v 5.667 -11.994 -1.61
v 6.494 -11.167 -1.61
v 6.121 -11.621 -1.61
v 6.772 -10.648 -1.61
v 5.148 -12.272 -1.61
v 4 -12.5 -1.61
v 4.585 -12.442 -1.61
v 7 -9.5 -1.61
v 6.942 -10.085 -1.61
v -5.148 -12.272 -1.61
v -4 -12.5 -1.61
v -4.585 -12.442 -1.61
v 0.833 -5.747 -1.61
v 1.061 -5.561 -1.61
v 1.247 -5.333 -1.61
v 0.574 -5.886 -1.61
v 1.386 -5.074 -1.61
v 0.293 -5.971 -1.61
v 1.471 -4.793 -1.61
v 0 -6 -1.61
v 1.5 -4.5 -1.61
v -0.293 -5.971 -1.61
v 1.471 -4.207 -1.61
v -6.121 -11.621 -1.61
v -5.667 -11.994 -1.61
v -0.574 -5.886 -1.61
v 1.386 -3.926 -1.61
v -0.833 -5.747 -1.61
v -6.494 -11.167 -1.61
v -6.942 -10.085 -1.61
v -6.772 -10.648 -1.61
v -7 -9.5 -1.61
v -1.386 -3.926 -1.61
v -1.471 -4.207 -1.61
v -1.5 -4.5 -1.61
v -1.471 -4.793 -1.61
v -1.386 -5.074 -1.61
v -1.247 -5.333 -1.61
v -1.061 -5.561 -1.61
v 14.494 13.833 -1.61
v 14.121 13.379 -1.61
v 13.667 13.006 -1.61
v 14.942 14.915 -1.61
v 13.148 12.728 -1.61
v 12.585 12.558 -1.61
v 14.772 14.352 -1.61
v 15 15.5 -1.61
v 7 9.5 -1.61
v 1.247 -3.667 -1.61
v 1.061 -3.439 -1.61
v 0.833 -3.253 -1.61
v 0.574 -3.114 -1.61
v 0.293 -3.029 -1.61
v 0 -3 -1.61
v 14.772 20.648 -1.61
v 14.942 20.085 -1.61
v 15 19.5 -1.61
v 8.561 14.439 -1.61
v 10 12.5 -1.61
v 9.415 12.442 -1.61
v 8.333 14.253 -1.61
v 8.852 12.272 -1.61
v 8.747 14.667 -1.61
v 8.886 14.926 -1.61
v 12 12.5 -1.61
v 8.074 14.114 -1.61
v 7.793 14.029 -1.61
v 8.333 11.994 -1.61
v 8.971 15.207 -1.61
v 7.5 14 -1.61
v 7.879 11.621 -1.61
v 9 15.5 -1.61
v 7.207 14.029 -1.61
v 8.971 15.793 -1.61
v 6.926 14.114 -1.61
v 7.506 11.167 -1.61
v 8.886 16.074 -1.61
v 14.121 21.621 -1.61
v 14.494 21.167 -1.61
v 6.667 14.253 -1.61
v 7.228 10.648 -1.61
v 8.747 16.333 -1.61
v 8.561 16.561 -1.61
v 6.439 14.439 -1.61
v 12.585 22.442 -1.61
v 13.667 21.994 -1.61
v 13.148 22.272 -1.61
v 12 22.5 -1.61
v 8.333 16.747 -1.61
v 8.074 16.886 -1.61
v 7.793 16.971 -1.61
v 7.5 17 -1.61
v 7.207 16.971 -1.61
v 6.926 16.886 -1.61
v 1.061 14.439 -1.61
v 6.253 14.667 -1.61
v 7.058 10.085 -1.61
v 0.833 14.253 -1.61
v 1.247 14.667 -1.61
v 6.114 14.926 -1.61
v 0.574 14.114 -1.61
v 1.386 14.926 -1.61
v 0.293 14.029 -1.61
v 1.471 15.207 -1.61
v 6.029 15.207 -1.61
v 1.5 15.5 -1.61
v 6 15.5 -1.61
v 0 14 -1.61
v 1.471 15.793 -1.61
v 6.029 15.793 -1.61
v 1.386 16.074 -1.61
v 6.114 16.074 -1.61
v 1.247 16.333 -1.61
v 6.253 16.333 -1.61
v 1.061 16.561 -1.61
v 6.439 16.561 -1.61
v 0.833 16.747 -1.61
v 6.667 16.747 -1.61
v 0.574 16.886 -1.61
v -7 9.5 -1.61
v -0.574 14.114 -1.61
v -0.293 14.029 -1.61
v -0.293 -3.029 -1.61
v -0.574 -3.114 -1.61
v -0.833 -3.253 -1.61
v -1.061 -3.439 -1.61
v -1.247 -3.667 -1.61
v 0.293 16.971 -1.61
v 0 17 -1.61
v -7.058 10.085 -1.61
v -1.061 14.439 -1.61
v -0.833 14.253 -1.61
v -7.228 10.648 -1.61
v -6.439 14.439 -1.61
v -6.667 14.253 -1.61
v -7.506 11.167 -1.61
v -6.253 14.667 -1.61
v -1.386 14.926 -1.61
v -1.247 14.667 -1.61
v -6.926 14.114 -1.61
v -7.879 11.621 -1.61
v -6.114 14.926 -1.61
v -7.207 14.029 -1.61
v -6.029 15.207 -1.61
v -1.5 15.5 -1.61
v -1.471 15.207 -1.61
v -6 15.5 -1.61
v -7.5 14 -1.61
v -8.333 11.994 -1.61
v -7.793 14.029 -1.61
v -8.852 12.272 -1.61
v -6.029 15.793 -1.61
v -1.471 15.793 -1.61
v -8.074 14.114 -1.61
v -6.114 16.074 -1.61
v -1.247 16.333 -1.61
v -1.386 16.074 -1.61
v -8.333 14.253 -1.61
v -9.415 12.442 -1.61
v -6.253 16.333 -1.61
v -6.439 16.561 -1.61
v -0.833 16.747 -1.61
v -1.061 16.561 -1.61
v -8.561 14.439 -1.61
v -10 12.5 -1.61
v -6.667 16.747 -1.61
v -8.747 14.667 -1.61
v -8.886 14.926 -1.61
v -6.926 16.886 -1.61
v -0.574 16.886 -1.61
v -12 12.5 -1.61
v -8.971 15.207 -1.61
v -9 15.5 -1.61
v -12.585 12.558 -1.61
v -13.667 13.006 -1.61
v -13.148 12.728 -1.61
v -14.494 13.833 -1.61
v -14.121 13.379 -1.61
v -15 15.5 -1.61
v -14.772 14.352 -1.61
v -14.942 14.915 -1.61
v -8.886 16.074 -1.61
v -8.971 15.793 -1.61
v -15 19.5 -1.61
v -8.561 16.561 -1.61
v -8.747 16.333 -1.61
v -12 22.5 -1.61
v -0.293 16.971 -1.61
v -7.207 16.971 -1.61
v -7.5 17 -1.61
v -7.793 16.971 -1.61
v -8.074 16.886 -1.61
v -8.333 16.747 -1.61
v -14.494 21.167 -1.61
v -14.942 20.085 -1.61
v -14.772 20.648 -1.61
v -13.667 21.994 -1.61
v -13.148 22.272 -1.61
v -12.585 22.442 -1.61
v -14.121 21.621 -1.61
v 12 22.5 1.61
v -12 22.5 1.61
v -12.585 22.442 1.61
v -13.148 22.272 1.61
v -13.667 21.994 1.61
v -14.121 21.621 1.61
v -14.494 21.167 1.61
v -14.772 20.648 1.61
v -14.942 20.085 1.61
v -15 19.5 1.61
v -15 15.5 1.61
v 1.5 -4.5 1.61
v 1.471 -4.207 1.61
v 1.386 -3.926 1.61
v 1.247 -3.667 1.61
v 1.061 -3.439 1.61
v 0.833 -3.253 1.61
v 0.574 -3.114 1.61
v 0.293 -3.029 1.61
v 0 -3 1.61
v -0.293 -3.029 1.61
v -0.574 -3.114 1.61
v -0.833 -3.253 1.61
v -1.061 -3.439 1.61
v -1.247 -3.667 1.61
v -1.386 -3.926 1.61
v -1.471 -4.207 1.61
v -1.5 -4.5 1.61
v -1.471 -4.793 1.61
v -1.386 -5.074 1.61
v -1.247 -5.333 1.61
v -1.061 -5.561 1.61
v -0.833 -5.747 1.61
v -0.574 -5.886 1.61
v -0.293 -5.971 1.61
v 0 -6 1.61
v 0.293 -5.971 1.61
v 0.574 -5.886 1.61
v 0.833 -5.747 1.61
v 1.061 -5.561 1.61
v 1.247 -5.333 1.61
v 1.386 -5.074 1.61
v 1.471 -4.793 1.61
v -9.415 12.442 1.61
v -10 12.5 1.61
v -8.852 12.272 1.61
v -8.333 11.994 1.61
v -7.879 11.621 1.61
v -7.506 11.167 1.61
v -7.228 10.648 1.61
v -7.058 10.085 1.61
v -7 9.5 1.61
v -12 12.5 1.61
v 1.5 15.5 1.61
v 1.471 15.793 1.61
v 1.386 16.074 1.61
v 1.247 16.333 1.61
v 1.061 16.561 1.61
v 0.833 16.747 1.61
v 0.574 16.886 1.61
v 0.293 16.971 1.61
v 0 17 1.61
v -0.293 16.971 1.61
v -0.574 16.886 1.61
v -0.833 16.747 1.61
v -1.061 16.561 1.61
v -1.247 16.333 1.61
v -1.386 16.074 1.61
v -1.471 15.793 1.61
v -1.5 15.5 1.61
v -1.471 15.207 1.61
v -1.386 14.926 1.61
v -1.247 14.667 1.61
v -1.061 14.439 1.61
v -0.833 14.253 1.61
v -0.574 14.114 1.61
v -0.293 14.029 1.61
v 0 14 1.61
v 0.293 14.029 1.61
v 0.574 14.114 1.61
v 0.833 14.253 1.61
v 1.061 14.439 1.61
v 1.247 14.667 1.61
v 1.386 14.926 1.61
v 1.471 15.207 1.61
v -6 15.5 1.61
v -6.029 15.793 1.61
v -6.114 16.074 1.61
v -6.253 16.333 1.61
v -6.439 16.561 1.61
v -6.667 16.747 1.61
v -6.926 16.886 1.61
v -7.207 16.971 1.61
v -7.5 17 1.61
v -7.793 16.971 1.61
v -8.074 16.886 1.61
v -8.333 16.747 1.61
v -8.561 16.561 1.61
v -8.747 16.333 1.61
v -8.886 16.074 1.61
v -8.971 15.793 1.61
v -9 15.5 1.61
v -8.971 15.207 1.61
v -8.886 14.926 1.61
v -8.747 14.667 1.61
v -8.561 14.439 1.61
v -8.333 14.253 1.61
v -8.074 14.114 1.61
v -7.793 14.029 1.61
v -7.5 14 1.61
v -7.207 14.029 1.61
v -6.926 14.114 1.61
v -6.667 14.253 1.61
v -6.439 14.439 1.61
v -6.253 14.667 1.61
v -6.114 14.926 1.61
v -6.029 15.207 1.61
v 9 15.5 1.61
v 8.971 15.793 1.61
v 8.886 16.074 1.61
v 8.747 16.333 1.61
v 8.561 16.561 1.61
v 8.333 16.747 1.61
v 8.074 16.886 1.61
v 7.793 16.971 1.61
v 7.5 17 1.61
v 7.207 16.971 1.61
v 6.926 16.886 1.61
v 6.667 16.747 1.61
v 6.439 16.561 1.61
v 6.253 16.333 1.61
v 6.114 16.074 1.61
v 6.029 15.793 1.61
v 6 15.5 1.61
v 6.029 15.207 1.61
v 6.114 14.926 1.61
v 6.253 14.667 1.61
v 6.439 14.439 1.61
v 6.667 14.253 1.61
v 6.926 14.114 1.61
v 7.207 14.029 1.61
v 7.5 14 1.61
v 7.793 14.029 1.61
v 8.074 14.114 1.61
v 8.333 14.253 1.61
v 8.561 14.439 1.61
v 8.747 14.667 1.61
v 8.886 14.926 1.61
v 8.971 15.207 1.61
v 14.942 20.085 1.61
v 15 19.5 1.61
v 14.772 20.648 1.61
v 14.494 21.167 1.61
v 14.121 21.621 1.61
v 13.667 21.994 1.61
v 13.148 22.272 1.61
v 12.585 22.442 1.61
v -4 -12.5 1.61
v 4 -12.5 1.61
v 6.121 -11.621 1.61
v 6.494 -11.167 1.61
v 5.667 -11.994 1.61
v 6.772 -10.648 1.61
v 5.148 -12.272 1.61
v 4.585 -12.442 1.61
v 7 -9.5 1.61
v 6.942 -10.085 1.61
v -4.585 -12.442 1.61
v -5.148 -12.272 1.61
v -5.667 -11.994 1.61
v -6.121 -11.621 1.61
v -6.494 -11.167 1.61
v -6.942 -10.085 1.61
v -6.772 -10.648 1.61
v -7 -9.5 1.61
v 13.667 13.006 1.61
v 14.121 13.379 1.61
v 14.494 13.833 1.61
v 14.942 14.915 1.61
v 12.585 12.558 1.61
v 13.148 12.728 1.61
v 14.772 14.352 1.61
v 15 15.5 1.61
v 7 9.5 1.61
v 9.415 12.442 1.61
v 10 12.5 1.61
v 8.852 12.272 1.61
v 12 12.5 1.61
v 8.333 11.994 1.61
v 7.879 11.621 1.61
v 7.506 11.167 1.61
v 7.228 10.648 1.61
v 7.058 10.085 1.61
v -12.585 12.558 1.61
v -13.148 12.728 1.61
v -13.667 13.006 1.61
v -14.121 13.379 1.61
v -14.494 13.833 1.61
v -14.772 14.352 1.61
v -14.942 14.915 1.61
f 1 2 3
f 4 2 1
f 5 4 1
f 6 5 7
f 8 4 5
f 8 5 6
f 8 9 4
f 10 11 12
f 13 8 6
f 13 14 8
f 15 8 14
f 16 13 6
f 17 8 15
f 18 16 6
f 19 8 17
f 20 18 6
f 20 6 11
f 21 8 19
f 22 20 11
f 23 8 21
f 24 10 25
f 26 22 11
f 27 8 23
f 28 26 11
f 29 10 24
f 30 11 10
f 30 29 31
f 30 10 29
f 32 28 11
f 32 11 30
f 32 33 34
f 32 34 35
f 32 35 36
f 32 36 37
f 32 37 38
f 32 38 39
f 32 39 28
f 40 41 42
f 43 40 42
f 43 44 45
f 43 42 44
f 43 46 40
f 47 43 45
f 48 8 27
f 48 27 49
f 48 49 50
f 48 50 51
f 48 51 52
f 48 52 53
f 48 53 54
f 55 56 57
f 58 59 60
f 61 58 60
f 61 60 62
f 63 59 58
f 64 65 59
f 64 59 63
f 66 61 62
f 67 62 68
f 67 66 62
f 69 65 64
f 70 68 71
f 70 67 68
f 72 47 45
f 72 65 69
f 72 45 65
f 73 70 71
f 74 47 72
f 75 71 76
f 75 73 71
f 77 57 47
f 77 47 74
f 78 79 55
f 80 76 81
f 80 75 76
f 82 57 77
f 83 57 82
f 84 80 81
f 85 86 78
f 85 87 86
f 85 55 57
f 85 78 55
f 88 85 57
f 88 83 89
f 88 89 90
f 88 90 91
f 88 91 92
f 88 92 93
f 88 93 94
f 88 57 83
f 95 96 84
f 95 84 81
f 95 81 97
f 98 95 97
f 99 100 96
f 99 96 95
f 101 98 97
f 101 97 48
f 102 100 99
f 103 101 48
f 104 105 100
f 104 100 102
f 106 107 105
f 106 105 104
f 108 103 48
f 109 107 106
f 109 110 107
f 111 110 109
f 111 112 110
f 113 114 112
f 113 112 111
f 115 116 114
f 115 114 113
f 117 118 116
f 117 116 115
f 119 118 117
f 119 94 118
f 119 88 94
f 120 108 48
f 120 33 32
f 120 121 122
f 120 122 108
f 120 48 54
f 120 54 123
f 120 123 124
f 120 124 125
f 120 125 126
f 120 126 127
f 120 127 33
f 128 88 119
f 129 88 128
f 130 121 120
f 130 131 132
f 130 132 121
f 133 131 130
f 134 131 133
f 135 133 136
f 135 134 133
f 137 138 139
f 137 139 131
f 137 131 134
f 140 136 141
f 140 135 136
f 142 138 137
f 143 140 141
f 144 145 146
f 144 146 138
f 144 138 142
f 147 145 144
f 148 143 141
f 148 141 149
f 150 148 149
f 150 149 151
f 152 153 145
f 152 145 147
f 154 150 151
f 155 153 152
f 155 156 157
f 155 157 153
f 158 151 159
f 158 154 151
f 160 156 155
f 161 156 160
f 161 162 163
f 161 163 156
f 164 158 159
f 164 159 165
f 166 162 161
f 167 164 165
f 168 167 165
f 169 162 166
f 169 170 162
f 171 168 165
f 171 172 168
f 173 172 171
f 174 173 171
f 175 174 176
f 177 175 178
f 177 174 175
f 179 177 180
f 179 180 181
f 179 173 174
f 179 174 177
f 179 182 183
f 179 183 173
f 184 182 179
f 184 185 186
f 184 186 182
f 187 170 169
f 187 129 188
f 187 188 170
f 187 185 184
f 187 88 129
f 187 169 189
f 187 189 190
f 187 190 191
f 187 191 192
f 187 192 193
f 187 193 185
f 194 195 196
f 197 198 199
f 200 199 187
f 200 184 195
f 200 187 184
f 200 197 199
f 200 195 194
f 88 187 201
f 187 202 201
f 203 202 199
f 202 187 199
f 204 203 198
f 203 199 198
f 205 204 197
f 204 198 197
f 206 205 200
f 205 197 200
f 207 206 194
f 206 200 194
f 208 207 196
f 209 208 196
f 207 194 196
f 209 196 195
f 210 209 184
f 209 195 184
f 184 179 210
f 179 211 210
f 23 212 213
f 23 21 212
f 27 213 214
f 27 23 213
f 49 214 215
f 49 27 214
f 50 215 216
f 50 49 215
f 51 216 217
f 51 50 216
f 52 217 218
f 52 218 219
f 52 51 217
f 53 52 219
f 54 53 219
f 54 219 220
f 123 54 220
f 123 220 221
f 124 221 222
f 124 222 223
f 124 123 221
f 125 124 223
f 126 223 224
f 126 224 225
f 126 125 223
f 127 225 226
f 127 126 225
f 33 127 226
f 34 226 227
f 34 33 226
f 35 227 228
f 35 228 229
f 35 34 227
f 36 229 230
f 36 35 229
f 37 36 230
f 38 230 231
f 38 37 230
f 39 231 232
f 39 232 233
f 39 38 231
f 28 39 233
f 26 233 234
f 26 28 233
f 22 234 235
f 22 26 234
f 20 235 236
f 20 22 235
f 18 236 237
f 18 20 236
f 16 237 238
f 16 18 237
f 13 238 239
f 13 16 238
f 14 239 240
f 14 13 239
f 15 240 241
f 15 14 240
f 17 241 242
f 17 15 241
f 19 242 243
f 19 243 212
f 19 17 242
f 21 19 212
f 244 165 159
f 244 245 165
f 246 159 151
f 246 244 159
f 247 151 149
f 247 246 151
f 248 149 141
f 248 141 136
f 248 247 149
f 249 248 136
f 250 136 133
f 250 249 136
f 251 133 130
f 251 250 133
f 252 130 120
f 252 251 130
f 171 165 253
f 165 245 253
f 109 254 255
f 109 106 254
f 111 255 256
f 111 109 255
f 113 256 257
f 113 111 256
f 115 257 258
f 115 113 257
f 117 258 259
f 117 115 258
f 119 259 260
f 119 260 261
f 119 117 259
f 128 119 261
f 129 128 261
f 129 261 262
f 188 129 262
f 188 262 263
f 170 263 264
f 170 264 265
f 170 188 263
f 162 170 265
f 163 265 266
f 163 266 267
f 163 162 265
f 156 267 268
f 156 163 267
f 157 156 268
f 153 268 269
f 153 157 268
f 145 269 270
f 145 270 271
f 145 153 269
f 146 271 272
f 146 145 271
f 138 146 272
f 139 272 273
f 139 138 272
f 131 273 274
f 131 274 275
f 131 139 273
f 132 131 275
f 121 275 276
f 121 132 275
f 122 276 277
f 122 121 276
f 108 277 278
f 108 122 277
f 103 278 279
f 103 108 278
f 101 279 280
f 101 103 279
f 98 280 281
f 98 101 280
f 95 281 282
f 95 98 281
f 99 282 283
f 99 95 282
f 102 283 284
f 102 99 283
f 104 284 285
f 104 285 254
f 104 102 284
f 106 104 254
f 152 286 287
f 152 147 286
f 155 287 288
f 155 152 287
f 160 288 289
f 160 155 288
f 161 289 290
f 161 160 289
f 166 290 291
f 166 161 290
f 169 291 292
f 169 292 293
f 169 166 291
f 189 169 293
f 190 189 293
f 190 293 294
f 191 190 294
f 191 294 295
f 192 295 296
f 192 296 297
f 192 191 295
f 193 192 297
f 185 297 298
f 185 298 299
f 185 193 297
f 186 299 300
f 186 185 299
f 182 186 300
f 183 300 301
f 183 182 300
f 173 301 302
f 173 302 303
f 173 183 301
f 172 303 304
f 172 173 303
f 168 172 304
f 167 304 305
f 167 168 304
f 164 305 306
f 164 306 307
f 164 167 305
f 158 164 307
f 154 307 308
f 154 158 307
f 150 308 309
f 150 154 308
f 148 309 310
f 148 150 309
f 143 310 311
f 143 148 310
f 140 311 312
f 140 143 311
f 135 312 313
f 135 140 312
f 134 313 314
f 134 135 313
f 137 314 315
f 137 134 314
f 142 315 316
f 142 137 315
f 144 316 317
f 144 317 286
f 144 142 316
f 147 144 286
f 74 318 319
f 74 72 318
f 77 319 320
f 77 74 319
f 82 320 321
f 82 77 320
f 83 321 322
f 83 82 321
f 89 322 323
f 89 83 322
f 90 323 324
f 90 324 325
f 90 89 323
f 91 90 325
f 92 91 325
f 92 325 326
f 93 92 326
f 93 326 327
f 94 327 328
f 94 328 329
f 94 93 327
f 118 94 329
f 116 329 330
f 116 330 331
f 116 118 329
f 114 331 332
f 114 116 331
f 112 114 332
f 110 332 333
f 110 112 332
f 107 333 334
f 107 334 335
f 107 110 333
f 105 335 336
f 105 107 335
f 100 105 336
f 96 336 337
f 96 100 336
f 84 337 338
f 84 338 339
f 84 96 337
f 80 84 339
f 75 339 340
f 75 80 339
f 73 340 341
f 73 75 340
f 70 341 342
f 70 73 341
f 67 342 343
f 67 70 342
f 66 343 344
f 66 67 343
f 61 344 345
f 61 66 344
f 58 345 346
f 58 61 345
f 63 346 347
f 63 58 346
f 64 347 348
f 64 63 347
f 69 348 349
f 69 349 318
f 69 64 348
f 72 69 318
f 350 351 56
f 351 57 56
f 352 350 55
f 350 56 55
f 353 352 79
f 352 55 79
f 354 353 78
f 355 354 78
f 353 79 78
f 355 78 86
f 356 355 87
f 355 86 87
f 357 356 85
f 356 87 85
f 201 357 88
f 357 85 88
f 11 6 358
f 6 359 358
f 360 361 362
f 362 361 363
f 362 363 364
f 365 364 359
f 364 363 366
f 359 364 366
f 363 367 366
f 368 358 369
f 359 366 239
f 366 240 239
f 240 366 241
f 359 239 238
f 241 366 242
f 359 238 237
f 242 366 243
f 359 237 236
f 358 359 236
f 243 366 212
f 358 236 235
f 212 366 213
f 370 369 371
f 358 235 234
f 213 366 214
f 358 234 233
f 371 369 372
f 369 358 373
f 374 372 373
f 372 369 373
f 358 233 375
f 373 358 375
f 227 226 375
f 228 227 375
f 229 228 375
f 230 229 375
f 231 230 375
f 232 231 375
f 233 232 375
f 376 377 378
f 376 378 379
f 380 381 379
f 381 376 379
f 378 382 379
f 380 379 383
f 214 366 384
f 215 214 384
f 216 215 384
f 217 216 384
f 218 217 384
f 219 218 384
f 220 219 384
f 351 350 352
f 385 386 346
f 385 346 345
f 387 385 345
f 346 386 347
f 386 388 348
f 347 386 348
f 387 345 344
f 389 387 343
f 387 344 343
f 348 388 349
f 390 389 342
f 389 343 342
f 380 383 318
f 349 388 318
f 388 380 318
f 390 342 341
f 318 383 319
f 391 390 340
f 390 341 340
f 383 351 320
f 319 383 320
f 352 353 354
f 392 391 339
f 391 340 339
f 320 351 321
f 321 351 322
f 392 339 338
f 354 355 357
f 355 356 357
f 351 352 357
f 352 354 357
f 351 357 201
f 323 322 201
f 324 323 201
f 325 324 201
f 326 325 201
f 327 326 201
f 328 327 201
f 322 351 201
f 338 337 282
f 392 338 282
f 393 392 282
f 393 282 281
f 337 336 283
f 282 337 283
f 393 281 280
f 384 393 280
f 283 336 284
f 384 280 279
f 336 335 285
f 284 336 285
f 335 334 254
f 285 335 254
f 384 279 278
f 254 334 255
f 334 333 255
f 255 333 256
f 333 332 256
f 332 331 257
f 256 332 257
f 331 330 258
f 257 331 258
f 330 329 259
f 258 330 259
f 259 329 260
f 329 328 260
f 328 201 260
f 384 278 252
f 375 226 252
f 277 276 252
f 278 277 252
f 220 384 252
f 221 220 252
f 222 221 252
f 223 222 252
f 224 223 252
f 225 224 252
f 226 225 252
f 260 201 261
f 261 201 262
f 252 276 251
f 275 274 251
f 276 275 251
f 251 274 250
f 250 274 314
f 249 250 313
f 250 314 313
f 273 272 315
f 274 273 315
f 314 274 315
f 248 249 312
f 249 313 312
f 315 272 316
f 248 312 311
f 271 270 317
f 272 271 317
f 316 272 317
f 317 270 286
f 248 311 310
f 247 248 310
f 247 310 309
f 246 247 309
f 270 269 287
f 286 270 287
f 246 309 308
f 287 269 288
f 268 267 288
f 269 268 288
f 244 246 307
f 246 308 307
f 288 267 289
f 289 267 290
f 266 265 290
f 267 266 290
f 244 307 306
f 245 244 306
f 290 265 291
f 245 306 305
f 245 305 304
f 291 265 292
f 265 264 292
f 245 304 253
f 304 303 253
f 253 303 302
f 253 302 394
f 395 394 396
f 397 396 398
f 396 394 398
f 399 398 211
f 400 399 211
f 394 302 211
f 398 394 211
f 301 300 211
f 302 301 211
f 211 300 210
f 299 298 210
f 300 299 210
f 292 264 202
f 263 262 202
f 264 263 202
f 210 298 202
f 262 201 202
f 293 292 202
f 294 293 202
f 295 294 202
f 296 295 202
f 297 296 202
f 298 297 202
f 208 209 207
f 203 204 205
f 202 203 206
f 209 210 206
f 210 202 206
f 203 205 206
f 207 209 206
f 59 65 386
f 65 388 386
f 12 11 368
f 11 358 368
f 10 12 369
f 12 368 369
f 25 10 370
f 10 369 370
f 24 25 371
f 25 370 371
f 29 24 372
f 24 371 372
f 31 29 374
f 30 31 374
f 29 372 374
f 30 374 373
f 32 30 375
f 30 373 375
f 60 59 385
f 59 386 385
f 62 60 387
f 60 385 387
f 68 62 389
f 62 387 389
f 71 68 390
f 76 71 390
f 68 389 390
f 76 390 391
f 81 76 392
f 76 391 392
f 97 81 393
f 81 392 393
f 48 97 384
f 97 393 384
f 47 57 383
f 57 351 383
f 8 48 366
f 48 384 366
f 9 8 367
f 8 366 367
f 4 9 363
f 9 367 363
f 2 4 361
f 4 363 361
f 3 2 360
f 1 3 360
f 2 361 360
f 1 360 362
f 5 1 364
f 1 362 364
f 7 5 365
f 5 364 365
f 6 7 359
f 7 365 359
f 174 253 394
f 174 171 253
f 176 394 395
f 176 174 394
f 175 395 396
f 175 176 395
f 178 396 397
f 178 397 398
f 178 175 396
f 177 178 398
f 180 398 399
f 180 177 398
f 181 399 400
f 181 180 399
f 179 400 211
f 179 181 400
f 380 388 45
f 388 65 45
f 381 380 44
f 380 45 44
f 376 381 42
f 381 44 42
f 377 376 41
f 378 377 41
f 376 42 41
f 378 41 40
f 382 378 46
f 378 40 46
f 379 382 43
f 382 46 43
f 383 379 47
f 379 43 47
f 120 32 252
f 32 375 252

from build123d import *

# Parameters (mm, degrees)
SKETCH1_R           = 1.5
BOSS_EXTRUDE1_DEPTH = 1.61
FILLET1_R           = 3


with BuildPart() as part:
    # Sketch1 → Boss-Extrude1 (new body, symmetric)
    with BuildSketch(Plane.XY):
        Polygon((-7, 12.5), (-15, 12.5), (-15, 22.5), (15, 22.5), (15, 12.5), (7, 12.5), (7, -12.5), (-7, -12.5), align=None)
        with Locations((-7.5, 15.5)):
            Circle(SKETCH1_R, mode=Mode.SUBTRACT)
        with Locations((0, 15.5)):
            Circle(SKETCH1_R, mode=Mode.SUBTRACT)
        with Locations((7.5, 15.5)):
            Circle(SKETCH1_R, mode=Mode.SUBTRACT)
        with Locations((0, -4.5)):
            Circle(SKETCH1_R, mode=Mode.SUBTRACT)
    extrude(amount=BOSS_EXTRUDE1_DEPTH, both=True)

    # Fillet1
    fillet1_edges = [part.edges().sort_by_distance(p)[0] for p in [
        (7, 12.5, 0),
        (7, -12.5, 0),
        (-7, -12.5, 0),
        (-7, 12.5, 0),
        (-15, 12.5, 0),
        (-15, 22.5, 0),
        (15, 22.5, 0),
        (15, 12.5, 0),
    ]]
    fillet(fillet1_edges, radius=FILLET1_R)


solid = part.part
